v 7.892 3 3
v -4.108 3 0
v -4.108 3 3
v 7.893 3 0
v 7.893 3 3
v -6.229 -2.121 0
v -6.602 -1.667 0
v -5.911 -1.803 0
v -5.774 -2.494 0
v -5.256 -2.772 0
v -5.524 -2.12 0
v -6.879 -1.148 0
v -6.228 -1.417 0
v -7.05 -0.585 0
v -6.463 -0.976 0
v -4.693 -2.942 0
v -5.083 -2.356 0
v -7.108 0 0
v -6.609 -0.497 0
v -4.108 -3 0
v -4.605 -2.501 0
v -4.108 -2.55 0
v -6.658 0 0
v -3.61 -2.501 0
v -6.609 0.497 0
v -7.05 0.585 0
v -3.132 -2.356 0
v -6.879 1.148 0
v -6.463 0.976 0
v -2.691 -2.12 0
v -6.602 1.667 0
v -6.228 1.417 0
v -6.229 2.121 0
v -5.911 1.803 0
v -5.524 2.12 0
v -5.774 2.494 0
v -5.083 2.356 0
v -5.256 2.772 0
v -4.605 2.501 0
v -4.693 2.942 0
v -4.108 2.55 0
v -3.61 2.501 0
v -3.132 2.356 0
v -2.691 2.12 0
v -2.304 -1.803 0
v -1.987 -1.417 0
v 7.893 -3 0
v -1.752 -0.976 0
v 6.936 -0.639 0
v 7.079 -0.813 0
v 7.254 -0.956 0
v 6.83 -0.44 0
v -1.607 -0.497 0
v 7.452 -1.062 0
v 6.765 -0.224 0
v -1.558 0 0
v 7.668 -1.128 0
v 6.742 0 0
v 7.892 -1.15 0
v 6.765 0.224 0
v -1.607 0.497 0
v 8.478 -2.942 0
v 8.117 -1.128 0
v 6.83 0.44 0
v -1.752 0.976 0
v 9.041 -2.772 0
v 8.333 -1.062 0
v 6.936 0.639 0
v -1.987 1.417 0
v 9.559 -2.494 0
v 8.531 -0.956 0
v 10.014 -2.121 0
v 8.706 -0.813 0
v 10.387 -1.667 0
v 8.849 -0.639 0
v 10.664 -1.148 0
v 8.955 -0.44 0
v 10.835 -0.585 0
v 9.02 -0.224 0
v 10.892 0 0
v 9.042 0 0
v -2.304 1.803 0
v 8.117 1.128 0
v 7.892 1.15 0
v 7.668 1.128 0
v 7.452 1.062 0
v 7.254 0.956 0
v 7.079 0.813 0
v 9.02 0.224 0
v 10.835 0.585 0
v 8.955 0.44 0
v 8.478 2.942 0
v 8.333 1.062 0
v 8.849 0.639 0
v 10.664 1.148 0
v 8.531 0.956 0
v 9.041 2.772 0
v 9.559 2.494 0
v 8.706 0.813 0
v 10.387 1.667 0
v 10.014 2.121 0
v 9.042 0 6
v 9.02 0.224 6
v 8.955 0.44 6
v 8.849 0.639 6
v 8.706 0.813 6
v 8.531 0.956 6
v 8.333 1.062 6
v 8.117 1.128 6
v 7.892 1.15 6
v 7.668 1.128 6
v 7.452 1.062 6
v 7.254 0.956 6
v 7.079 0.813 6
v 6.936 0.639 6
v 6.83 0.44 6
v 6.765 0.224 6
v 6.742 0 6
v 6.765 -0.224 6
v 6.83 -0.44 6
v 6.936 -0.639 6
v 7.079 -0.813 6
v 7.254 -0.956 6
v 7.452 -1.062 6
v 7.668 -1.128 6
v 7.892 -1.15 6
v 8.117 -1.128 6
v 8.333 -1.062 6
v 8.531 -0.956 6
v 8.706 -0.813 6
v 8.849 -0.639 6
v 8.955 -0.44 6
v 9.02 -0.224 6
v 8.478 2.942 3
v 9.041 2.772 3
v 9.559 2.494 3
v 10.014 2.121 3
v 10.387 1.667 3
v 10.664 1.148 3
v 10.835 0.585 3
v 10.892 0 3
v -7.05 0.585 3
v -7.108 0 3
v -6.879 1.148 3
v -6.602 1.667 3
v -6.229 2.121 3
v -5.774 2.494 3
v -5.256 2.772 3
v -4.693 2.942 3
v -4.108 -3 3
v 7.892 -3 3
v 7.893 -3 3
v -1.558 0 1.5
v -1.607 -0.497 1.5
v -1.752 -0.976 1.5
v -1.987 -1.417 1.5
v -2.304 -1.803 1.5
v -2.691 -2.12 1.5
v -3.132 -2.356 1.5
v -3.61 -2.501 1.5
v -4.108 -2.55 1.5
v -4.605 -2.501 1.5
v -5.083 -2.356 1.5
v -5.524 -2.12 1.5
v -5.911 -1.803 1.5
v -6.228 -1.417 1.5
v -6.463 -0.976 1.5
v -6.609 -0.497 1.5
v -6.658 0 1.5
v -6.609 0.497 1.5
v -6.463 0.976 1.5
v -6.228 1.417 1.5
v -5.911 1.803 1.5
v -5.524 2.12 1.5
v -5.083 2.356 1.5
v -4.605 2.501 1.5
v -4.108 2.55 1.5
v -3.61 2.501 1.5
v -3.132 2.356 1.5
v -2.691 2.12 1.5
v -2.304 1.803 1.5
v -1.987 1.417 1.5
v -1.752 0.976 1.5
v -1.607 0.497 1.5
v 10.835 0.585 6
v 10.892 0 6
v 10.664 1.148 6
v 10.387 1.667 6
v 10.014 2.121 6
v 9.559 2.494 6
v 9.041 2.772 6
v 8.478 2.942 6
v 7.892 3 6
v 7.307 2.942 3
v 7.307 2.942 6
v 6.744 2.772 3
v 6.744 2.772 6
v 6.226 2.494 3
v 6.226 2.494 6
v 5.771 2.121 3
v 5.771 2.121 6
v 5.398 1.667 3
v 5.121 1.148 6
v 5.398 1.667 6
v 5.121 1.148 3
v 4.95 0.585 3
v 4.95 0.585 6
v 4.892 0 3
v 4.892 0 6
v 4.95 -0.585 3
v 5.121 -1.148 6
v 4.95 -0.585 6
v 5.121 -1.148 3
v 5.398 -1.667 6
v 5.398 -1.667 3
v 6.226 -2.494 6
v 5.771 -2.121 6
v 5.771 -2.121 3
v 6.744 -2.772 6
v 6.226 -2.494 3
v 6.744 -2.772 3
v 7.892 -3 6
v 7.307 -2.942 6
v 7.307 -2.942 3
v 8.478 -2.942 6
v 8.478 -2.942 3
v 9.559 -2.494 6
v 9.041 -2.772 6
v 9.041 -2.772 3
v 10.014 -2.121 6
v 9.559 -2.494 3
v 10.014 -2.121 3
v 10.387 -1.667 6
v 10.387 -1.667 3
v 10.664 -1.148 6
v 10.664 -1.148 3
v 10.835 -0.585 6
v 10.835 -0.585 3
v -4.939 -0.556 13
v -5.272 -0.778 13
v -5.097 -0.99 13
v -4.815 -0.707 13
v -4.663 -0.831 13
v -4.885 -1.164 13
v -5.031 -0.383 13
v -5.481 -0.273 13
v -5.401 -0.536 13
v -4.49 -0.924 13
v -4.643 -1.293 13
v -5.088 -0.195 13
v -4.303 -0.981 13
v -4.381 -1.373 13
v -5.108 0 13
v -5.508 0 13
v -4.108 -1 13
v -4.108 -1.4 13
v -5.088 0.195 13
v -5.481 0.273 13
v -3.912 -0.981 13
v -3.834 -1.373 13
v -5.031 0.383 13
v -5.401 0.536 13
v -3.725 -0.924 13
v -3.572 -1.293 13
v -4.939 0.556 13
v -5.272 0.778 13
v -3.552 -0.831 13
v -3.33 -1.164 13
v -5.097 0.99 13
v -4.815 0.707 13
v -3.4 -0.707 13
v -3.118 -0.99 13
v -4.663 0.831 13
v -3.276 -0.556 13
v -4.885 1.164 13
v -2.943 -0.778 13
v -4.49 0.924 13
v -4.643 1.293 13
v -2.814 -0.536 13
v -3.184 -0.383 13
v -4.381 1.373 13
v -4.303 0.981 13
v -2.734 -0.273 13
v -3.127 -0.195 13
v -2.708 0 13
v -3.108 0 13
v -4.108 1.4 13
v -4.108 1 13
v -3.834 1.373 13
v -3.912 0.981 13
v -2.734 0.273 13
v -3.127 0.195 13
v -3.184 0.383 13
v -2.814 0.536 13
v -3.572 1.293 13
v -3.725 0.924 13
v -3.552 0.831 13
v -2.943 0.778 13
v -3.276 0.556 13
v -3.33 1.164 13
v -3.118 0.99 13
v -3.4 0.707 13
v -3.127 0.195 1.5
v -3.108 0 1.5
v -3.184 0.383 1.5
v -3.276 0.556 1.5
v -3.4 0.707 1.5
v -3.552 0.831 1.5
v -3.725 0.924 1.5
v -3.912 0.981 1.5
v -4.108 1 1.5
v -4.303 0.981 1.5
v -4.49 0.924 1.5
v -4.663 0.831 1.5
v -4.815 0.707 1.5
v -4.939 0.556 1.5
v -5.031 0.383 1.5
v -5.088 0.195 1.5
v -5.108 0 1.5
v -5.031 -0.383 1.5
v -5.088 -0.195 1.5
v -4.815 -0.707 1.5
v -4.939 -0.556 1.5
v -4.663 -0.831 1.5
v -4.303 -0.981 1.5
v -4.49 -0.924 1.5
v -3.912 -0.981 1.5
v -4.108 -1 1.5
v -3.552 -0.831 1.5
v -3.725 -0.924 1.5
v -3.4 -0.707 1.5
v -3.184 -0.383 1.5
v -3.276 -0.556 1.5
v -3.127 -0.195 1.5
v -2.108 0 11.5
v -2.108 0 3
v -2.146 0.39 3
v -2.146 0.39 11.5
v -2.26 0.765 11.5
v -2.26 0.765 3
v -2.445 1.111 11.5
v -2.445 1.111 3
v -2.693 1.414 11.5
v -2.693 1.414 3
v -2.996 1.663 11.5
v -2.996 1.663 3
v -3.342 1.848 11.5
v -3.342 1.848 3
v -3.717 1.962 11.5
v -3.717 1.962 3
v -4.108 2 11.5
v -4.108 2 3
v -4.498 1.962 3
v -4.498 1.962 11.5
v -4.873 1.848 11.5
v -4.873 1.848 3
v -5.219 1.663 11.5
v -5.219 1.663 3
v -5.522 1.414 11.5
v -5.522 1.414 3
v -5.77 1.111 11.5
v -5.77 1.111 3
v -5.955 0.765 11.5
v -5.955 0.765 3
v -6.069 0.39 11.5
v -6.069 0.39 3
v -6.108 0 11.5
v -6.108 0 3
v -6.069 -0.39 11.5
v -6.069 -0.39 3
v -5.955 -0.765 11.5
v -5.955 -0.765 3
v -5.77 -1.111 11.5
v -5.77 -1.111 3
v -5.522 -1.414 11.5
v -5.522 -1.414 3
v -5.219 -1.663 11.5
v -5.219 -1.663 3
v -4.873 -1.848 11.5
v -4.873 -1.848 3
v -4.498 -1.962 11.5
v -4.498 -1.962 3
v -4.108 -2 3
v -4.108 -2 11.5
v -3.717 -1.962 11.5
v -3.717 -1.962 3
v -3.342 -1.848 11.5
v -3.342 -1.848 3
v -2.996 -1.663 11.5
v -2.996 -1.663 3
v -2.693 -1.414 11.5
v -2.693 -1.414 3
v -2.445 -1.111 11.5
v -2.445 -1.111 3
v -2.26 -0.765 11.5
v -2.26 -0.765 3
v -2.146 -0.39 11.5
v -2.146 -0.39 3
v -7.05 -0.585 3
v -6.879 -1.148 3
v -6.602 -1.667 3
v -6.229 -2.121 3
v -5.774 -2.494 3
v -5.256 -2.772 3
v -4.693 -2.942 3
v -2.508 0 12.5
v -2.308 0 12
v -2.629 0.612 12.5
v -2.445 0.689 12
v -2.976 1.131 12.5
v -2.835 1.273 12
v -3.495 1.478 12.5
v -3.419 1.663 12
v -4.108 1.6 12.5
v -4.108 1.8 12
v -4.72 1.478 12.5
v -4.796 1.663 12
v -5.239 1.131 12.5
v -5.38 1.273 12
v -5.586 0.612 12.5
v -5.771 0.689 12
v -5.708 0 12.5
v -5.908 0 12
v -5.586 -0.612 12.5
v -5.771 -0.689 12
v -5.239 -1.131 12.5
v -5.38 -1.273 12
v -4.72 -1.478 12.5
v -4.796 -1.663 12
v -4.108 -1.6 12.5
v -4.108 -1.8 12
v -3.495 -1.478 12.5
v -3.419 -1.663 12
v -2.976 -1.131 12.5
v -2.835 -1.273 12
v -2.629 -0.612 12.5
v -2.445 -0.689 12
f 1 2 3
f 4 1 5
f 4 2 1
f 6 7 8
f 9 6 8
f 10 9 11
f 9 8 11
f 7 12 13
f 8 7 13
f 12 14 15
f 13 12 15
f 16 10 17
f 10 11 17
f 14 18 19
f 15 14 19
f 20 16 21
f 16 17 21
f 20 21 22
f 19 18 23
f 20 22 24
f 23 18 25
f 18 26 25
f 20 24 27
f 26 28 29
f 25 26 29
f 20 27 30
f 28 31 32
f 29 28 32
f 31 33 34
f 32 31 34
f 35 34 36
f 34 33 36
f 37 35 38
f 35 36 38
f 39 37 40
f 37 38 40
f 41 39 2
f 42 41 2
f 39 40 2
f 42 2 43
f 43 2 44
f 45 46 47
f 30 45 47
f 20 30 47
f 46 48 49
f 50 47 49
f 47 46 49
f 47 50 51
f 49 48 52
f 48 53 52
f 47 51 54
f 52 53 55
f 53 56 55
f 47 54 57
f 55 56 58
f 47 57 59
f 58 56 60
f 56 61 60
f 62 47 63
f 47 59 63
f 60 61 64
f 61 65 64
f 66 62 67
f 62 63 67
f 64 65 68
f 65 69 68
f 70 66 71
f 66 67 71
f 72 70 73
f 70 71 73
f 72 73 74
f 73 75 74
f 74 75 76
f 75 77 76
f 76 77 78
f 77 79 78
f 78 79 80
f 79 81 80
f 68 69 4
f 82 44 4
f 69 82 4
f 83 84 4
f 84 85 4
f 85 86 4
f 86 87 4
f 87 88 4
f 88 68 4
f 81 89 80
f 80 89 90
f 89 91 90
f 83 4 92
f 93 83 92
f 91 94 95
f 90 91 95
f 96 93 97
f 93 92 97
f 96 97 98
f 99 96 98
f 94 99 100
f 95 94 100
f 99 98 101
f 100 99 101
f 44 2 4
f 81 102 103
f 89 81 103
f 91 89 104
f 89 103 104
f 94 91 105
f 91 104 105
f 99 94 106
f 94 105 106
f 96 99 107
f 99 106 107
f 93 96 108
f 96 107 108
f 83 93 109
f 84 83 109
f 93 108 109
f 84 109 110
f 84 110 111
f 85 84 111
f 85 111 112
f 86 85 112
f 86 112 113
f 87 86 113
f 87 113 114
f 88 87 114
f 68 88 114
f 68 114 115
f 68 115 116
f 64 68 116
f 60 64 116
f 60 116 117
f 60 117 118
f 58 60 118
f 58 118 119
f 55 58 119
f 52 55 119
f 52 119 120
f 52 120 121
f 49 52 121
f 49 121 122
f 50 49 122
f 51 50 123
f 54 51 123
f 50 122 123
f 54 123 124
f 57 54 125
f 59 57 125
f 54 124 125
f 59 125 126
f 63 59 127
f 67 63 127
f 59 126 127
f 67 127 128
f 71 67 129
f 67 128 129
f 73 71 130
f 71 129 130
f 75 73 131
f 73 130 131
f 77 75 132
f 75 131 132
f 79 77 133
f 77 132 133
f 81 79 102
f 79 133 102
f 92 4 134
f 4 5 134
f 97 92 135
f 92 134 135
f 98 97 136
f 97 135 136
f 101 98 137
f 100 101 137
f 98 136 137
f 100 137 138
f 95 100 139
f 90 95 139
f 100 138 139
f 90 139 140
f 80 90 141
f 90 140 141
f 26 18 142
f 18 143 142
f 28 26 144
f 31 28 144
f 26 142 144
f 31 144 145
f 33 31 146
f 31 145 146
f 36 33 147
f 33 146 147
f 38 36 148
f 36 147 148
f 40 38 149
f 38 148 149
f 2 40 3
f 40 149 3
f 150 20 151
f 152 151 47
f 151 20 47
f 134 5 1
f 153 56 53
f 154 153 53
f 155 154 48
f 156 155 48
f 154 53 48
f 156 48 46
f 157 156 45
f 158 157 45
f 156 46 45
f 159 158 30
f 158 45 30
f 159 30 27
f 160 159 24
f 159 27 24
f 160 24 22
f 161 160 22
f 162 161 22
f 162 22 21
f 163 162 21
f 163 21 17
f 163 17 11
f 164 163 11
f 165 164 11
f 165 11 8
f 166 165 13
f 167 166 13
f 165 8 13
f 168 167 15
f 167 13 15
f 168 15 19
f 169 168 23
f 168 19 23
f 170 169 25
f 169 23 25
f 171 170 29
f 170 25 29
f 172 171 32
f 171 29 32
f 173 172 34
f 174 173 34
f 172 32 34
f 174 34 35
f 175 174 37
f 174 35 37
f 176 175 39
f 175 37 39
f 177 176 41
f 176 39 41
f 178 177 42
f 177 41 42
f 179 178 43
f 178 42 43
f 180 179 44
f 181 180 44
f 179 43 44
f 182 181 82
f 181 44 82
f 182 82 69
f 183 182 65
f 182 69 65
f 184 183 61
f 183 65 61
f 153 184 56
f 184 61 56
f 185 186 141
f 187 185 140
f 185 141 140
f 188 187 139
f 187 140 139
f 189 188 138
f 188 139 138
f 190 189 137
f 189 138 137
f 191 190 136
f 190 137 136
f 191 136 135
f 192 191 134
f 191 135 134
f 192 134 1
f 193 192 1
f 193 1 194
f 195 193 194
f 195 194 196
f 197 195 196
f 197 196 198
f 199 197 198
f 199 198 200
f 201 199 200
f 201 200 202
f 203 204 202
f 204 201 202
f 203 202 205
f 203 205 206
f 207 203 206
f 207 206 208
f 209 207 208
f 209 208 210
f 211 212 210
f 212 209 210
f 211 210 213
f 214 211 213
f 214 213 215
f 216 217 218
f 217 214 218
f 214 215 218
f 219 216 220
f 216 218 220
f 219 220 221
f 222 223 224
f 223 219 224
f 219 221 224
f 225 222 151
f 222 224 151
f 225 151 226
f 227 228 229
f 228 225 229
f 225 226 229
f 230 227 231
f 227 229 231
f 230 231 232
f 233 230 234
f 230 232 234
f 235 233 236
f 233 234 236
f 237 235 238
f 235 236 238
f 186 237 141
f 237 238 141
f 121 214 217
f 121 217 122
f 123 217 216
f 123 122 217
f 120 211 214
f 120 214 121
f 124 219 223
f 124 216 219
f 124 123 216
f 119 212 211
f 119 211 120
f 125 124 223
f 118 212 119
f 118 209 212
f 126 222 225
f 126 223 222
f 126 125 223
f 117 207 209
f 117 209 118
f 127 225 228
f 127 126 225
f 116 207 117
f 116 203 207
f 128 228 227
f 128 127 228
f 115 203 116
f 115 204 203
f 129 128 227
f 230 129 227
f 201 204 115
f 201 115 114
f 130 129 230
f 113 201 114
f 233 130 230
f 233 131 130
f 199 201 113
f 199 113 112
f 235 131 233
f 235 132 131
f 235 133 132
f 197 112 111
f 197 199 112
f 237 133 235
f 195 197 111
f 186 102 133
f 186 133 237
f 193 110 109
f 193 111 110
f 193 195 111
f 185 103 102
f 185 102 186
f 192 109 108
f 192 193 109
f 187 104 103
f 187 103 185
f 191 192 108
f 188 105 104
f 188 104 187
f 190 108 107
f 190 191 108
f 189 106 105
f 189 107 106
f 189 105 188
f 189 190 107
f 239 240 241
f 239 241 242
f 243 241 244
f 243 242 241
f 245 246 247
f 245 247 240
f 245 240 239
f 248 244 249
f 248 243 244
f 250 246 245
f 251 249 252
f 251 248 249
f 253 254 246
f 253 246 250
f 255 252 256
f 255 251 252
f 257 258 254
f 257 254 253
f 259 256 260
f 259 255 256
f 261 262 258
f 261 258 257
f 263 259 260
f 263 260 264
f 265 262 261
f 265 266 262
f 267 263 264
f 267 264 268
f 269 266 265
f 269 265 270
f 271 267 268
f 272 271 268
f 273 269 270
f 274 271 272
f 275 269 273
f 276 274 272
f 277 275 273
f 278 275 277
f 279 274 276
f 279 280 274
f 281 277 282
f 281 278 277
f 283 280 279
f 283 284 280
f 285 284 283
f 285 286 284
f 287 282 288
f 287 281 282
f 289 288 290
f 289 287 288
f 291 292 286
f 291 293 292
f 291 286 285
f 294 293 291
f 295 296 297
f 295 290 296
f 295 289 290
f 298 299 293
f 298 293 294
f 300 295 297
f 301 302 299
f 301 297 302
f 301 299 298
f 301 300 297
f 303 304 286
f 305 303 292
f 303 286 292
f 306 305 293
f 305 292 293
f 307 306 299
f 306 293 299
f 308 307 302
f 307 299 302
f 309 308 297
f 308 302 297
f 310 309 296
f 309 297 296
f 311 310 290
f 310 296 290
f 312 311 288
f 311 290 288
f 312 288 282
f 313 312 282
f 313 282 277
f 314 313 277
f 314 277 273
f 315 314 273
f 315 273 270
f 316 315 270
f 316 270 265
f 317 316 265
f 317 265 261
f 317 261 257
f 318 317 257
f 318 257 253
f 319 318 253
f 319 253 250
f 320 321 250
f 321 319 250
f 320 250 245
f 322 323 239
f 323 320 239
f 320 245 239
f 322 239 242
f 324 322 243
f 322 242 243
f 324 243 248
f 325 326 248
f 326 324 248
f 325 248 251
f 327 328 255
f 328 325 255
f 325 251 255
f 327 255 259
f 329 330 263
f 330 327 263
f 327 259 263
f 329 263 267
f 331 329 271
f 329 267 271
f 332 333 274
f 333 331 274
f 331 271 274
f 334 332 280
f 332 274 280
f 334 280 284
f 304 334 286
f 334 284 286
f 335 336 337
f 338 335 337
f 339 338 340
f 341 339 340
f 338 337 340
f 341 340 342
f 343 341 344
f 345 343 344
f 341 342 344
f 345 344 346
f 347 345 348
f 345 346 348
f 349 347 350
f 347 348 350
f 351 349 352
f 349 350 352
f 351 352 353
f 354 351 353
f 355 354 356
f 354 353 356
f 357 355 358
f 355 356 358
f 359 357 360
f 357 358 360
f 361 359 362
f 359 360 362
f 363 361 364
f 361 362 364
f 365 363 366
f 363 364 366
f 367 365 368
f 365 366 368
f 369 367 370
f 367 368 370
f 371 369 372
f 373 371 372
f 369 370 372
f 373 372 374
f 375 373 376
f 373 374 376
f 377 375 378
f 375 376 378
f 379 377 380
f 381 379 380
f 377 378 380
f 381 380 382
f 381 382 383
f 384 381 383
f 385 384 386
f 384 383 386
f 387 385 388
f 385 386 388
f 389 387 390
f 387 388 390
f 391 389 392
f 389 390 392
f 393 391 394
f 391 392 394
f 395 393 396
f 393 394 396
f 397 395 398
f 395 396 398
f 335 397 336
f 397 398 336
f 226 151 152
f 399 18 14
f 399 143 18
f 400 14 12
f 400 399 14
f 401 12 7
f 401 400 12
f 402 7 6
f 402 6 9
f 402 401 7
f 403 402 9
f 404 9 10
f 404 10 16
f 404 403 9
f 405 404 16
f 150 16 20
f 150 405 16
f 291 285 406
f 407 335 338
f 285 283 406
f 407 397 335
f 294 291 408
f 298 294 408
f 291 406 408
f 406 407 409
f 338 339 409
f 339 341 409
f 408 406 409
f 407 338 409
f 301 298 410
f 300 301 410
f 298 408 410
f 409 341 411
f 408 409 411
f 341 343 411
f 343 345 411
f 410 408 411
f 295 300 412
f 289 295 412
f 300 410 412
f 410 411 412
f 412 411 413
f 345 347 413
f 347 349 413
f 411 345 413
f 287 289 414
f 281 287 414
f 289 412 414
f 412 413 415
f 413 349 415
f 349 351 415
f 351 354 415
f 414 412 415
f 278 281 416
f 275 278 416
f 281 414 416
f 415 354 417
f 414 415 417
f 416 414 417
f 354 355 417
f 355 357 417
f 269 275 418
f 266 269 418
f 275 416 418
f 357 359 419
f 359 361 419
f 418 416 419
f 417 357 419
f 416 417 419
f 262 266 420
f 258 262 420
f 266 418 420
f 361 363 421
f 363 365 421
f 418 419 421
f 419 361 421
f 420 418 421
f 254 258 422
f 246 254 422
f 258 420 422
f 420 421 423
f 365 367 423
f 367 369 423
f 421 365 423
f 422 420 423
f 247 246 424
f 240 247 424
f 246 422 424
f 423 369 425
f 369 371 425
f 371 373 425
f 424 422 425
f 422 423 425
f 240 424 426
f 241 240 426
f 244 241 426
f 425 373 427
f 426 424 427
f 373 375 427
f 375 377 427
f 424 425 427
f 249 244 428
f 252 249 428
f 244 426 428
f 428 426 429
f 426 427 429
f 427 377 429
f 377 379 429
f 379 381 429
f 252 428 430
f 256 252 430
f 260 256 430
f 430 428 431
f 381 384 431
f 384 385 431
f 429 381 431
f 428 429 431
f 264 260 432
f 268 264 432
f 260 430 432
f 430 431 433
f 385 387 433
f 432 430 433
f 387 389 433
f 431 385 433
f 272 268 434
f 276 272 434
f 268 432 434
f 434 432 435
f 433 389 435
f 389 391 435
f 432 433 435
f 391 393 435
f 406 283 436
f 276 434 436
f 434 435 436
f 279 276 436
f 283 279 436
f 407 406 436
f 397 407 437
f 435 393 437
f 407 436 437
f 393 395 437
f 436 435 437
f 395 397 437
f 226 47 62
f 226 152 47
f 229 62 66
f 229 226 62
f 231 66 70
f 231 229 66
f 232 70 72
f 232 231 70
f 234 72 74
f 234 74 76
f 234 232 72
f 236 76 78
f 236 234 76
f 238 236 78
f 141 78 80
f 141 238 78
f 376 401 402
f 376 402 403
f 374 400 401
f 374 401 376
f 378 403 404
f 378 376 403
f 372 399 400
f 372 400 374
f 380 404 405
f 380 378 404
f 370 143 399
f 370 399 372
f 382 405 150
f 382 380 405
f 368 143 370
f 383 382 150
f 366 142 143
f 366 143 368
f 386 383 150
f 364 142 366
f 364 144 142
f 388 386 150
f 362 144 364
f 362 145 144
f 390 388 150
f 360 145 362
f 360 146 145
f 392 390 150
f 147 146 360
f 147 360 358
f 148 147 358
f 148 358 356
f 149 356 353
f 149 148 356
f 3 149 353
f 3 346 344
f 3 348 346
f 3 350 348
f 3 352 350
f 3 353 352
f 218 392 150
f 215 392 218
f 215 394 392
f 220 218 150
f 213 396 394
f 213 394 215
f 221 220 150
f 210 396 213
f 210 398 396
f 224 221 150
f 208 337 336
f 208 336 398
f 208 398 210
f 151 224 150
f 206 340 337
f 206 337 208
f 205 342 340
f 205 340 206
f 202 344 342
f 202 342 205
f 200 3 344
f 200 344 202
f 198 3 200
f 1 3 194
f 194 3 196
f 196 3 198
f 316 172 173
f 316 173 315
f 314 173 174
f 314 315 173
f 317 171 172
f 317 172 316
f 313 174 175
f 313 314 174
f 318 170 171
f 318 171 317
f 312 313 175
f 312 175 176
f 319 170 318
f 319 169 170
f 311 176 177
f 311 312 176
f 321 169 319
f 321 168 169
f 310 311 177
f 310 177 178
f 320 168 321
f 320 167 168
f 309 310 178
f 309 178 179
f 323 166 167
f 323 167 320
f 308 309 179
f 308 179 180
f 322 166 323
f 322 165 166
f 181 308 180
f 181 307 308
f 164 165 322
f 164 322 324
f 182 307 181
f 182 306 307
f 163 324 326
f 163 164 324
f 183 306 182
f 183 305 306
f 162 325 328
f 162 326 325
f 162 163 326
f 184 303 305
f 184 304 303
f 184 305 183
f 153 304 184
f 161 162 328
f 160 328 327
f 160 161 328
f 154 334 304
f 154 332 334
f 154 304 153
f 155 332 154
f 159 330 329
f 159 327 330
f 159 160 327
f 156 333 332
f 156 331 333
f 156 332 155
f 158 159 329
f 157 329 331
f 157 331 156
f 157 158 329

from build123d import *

# Parameters (mm, degrees)
F0_W      = 18
F0_H      = 6
F1_DEPTH  = 3
F2_R      = 3
F2_R_2    = 2
F3_DEPTH  = 10
F4_R      = 1
F4_R_2    = 1.15
F5_DEPTH  = 20
F6_SIZE2  = 1.5
F6_SIZE   = 0.6
F7_W      = 11.6012076614
F7_H      = 11.8295210414
F8_DEPTH  = 7
F9_R      = 2.9999
F10_R     = 2.55
F10_R_2   = 1
F11_DEPTH = 1.5


# Not quite as in the source:
# - a fillet or chamfer is up to 0.001 mm smaller than in the source, because OpenCascade refuses the exact size


with BuildPart() as f1:
    # F0 (on Top) → F1 (new body)
    with BuildSketch(Plane.XY):
        with Locations((1.8924829921, 0)):
            Rectangle(F0_W, F0_H)
    extrude(amount=F1_DEPTH)

    # F2 (on face) → F3 (join)
    with BuildSketch(Plane.XY.offset(3)):
        with Locations((7.8924829921, 0)):
            Circle(F2_R)
        with Locations((-4.1075170079, 0)):
            Circle(F2_R_2)
    extrude(amount=F3_DEPTH)

    # F4 (on face) → F5 (cut)
    with BuildSketch(Plane.XY.offset(13)):
        with Locations((-4.1075170079, 0)):
            Circle(F4_R)
        with Locations((7.8924829921, 0)):
            Circle(F4_R_2)
    extrude(amount=-F5_DEPTH, mode=Mode.SUBTRACT)

    # F6
    f6_edges = [f1.edges().sort_by_distance(p)[0] for p in [
        (-6.107517, 0, 13),
    ]]
    f6_side = f1.faces().sort_by_distance((-6.050948, 0, 13))[0]
    chamfer(f6_edges, length=F6_SIZE, length2=F6_SIZE2, reference=f6_side)

    # F7 (on face) → F8 (cut)
    with BuildSketch(Plane.XY.offset(13)):
        with Locations((7.5882198871, -0.5373002496)):
            Rectangle(F7_W, F7_H)
    extrude(amount=-F8_DEPTH, mode=Mode.SUBTRACT)

    # F9 (radius 3 in the source; OpenCascade refuses exactly that, so slightly less here)
    f9_edges = [f1.edges().sort_by_distance(p)[0] for p in [
        (10.892483, -3, 1.5),
        (10.892483, 3, 1.5),
        (-7.107517, 3, 1.5),
        (-7.107517, -3, 1.5),
    ]]
    fillet(f9_edges, radius=F9_R)

    # F10 (on face) → F11 (cut)
    with BuildSketch(Plane(origin=(0, 0, 0), x_dir=(1, 0, 0), z_dir=(0, 0, -1))):
        with Locations((-4.1075170079, 0)):
            Circle(F10_R)
        with Locations((-4.1075170079, 0)):
            Circle(F10_R_2, mode=Mode.SUBTRACT)
    extrude(amount=-F11_DEPTH, mode=Mode.SUBTRACT)


solid = f1.part
